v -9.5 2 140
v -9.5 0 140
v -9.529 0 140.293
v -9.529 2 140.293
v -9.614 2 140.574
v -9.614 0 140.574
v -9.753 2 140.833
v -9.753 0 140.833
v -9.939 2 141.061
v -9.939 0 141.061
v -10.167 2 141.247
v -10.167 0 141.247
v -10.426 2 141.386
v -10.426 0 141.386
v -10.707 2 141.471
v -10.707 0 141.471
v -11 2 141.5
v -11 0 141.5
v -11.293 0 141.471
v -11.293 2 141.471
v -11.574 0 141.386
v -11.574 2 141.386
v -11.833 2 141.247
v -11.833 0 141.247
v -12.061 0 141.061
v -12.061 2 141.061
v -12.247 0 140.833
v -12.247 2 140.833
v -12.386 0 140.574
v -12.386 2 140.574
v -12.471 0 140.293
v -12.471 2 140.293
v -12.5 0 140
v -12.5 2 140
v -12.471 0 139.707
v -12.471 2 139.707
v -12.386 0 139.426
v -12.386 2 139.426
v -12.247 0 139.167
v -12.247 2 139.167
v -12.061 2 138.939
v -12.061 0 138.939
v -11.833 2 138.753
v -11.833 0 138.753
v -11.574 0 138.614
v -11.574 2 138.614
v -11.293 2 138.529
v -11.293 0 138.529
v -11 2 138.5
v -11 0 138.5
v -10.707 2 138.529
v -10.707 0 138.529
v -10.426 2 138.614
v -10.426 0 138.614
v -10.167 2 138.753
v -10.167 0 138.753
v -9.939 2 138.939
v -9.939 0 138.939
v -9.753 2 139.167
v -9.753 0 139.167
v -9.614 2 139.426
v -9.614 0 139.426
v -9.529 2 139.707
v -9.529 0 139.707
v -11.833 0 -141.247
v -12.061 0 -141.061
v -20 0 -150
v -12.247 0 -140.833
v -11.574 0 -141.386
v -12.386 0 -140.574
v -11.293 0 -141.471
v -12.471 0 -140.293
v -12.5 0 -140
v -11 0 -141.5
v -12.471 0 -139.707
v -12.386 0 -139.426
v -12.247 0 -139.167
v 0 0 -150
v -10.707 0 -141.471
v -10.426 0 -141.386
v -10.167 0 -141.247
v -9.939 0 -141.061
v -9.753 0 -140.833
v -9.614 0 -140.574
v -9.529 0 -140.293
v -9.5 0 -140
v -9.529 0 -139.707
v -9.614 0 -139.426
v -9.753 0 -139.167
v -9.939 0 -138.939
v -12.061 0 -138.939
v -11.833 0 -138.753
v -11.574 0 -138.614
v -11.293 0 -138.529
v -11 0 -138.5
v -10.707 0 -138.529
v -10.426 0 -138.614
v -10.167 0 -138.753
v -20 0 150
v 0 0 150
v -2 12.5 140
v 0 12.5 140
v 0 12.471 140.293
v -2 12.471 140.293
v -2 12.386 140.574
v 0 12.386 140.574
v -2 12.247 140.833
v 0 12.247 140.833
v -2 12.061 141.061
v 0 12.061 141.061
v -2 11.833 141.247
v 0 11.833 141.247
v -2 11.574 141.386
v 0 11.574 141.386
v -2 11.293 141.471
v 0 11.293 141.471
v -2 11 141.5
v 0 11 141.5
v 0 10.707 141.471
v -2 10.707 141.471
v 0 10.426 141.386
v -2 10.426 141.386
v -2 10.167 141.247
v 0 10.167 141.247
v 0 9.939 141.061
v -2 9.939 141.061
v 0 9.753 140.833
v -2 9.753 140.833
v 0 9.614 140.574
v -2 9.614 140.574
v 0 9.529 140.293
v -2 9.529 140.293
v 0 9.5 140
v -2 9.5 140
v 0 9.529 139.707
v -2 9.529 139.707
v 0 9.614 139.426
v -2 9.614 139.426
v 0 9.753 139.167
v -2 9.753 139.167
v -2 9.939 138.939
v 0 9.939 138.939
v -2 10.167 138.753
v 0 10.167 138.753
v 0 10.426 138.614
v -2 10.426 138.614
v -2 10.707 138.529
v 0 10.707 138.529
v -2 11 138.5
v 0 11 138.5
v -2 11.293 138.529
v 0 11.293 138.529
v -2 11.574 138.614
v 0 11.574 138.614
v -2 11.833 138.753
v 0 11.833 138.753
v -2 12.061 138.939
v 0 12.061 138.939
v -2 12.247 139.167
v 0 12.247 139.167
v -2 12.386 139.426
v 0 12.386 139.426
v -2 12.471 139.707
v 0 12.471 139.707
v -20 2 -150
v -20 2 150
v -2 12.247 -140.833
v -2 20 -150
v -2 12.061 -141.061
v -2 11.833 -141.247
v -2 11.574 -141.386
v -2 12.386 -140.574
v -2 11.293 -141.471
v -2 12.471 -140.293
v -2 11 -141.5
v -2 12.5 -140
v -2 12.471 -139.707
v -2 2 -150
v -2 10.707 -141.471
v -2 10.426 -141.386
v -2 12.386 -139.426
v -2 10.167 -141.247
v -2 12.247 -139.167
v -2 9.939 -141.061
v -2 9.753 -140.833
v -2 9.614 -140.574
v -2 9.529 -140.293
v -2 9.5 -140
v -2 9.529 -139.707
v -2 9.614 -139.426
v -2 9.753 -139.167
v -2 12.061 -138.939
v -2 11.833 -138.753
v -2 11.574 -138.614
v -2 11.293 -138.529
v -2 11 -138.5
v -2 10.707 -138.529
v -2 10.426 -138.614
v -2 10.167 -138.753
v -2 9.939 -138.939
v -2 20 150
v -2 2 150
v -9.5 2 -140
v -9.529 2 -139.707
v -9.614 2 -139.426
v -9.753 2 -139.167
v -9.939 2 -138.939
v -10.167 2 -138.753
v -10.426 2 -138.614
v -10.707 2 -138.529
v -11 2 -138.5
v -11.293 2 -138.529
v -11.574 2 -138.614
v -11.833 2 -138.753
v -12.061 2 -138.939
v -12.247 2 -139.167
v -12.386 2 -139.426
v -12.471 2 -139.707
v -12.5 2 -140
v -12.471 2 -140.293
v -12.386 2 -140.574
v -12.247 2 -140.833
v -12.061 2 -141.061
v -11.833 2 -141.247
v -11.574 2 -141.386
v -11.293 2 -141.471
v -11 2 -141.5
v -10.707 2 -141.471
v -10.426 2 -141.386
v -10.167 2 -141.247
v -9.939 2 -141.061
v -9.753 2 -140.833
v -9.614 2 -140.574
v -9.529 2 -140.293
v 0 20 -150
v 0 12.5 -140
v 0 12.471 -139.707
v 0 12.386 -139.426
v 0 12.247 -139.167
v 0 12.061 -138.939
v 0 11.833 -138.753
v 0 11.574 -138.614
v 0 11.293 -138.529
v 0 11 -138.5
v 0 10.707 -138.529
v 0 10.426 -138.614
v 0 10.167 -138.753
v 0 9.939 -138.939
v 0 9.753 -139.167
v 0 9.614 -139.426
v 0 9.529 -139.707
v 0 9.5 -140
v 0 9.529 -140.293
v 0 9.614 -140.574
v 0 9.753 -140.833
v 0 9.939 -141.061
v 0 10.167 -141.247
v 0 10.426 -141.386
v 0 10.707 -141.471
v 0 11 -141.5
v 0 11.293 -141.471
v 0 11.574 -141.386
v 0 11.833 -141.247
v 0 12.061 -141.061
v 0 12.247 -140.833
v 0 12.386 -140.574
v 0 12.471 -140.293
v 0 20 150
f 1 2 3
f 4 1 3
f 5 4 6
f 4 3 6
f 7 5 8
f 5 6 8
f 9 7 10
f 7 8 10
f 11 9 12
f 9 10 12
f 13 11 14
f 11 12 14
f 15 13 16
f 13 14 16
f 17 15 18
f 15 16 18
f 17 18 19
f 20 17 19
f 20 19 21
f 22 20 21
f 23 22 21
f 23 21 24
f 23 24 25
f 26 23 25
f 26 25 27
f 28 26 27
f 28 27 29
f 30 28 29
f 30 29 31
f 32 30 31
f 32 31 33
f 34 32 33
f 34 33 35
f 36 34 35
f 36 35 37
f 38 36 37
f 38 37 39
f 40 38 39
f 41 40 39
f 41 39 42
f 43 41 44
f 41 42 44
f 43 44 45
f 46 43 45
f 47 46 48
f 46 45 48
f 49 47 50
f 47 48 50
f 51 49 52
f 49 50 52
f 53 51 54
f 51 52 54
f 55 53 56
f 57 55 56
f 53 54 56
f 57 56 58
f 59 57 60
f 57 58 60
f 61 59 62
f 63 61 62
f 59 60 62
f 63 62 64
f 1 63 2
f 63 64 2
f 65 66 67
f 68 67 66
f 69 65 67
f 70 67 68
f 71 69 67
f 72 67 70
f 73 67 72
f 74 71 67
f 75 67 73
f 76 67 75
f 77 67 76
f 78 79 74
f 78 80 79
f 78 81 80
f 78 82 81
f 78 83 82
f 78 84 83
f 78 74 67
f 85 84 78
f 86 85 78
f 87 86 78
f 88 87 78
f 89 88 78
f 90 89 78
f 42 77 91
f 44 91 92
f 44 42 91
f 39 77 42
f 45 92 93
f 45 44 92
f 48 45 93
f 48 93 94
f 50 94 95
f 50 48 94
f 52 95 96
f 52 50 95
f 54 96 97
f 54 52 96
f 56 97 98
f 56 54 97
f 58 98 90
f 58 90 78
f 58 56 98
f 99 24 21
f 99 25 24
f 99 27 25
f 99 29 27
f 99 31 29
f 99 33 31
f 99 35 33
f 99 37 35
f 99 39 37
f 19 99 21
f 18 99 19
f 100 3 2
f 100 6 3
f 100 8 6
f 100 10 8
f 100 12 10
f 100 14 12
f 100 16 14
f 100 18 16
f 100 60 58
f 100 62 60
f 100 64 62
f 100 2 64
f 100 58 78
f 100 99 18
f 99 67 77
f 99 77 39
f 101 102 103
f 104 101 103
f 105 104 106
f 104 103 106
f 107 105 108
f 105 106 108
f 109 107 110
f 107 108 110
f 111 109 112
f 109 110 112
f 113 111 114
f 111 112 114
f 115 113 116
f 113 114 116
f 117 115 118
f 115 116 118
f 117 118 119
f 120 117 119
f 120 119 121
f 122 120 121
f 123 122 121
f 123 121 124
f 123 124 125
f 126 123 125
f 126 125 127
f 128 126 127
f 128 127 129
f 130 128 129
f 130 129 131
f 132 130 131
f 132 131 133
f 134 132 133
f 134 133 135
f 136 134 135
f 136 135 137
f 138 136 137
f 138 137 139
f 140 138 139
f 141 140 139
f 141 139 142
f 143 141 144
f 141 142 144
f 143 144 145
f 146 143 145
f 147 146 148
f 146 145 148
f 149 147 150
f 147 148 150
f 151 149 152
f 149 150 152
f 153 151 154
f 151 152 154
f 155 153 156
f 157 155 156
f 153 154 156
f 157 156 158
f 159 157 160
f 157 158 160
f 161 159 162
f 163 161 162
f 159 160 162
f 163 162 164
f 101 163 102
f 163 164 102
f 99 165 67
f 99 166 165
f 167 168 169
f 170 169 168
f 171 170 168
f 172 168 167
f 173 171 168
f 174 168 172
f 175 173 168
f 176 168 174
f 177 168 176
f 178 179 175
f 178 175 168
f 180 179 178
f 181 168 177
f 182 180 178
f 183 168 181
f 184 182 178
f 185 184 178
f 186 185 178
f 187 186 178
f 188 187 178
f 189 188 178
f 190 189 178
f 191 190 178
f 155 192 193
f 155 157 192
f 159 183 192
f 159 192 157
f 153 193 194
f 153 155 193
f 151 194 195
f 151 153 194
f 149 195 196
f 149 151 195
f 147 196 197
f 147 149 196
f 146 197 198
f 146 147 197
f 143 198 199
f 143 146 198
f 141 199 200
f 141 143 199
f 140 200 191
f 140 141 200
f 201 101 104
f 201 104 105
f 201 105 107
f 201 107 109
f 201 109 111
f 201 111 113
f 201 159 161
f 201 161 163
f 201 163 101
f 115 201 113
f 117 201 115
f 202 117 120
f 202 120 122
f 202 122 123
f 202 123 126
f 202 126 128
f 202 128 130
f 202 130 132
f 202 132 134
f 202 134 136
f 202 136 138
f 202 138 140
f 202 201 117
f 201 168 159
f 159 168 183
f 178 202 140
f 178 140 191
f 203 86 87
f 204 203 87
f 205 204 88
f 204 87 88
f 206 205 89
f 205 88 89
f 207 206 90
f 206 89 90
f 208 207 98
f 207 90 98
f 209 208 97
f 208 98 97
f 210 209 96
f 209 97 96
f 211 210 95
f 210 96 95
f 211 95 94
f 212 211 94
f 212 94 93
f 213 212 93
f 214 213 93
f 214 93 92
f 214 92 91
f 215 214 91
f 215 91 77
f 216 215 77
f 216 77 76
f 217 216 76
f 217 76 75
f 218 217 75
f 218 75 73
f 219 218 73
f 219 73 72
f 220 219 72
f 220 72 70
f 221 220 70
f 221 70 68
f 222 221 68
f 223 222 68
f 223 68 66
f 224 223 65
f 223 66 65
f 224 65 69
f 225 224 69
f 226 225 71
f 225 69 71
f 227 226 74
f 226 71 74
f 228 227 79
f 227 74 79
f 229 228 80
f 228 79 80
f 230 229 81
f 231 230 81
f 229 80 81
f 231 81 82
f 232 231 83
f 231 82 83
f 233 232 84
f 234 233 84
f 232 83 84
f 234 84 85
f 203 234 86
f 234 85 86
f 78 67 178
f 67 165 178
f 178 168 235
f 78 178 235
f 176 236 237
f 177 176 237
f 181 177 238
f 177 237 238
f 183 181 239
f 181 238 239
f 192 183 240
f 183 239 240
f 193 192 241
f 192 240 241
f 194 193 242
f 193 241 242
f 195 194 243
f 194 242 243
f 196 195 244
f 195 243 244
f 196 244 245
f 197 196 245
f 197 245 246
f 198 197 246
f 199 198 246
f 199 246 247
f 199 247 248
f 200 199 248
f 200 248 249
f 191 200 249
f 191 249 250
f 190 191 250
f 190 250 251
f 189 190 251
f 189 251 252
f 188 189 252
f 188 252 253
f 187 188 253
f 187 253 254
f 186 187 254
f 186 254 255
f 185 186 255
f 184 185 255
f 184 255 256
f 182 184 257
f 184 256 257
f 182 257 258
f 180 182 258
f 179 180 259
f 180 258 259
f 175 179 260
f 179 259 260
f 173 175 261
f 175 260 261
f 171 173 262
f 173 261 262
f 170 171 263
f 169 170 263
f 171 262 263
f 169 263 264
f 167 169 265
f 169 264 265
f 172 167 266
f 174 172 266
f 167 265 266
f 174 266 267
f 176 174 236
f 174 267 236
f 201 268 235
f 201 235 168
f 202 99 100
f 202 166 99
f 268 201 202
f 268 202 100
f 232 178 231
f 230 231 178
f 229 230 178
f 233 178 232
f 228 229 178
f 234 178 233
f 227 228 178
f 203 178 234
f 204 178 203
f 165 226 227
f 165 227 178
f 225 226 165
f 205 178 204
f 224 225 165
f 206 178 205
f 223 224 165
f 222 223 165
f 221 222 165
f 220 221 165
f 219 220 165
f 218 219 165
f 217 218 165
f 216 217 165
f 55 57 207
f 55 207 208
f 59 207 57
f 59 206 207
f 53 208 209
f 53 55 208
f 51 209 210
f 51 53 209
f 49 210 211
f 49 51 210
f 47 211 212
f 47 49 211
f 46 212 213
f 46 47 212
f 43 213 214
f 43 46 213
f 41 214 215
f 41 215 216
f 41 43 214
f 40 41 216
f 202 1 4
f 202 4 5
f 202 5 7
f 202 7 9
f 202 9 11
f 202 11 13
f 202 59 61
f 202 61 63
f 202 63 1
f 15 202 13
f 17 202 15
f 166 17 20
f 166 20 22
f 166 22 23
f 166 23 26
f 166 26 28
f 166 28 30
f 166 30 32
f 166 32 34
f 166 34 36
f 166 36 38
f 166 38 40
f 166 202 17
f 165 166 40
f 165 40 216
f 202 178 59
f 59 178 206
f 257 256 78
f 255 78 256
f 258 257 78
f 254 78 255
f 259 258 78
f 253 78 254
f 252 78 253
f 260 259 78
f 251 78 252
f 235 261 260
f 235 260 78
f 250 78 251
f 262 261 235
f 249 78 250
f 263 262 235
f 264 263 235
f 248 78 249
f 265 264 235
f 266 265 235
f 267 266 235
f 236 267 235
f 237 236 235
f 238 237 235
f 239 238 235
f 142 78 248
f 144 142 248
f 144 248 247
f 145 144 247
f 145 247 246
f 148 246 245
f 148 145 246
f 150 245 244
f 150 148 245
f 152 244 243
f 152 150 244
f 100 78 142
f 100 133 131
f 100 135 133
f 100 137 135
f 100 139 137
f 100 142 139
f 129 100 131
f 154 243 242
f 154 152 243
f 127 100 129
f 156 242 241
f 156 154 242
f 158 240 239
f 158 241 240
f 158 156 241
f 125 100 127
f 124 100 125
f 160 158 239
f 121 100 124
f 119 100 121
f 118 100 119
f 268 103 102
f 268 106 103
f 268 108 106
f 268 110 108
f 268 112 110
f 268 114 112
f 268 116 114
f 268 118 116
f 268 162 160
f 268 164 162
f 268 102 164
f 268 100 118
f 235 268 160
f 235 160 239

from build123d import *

# Parameters (mm, degrees)
F1_DEPTH = 150
F2_R     = 1.5
F3_DEPTH = 20.001
F4_R     = 1.5
F5_DEPTH = 20.001


with BuildPart() as f1:
    # F0 (on Top) → F1 (new body, symmetric)
    with BuildSketch(Plane.XY):
        Polygon((-20, 0), (0, 0), (0, 20), (-2, 20), (-2, 2), (-20, 2), align=None)
    extrude(amount=F1_DEPTH, both=True)

    # F2 (on face) → F3 (cut, through all)
    with BuildSketch(Plane.YZ):
        with Locations((11, 140)):
            Circle(F2_R)
        with Locations((11, -140)):
            Circle(F2_R)
    extrude(amount=-F3_DEPTH, mode=Mode.SUBTRACT)

    # F4 (on face) → F5 (cut, through all)
    with BuildSketch(Plane.XZ):
        with Locations((-11, 140)):
            Circle(F4_R)
        with Locations((-11, -140)):
            Circle(F4_R)
    extrude(amount=-F5_DEPTH, mode=Mode.SUBTRACT)


solid = f1.part
